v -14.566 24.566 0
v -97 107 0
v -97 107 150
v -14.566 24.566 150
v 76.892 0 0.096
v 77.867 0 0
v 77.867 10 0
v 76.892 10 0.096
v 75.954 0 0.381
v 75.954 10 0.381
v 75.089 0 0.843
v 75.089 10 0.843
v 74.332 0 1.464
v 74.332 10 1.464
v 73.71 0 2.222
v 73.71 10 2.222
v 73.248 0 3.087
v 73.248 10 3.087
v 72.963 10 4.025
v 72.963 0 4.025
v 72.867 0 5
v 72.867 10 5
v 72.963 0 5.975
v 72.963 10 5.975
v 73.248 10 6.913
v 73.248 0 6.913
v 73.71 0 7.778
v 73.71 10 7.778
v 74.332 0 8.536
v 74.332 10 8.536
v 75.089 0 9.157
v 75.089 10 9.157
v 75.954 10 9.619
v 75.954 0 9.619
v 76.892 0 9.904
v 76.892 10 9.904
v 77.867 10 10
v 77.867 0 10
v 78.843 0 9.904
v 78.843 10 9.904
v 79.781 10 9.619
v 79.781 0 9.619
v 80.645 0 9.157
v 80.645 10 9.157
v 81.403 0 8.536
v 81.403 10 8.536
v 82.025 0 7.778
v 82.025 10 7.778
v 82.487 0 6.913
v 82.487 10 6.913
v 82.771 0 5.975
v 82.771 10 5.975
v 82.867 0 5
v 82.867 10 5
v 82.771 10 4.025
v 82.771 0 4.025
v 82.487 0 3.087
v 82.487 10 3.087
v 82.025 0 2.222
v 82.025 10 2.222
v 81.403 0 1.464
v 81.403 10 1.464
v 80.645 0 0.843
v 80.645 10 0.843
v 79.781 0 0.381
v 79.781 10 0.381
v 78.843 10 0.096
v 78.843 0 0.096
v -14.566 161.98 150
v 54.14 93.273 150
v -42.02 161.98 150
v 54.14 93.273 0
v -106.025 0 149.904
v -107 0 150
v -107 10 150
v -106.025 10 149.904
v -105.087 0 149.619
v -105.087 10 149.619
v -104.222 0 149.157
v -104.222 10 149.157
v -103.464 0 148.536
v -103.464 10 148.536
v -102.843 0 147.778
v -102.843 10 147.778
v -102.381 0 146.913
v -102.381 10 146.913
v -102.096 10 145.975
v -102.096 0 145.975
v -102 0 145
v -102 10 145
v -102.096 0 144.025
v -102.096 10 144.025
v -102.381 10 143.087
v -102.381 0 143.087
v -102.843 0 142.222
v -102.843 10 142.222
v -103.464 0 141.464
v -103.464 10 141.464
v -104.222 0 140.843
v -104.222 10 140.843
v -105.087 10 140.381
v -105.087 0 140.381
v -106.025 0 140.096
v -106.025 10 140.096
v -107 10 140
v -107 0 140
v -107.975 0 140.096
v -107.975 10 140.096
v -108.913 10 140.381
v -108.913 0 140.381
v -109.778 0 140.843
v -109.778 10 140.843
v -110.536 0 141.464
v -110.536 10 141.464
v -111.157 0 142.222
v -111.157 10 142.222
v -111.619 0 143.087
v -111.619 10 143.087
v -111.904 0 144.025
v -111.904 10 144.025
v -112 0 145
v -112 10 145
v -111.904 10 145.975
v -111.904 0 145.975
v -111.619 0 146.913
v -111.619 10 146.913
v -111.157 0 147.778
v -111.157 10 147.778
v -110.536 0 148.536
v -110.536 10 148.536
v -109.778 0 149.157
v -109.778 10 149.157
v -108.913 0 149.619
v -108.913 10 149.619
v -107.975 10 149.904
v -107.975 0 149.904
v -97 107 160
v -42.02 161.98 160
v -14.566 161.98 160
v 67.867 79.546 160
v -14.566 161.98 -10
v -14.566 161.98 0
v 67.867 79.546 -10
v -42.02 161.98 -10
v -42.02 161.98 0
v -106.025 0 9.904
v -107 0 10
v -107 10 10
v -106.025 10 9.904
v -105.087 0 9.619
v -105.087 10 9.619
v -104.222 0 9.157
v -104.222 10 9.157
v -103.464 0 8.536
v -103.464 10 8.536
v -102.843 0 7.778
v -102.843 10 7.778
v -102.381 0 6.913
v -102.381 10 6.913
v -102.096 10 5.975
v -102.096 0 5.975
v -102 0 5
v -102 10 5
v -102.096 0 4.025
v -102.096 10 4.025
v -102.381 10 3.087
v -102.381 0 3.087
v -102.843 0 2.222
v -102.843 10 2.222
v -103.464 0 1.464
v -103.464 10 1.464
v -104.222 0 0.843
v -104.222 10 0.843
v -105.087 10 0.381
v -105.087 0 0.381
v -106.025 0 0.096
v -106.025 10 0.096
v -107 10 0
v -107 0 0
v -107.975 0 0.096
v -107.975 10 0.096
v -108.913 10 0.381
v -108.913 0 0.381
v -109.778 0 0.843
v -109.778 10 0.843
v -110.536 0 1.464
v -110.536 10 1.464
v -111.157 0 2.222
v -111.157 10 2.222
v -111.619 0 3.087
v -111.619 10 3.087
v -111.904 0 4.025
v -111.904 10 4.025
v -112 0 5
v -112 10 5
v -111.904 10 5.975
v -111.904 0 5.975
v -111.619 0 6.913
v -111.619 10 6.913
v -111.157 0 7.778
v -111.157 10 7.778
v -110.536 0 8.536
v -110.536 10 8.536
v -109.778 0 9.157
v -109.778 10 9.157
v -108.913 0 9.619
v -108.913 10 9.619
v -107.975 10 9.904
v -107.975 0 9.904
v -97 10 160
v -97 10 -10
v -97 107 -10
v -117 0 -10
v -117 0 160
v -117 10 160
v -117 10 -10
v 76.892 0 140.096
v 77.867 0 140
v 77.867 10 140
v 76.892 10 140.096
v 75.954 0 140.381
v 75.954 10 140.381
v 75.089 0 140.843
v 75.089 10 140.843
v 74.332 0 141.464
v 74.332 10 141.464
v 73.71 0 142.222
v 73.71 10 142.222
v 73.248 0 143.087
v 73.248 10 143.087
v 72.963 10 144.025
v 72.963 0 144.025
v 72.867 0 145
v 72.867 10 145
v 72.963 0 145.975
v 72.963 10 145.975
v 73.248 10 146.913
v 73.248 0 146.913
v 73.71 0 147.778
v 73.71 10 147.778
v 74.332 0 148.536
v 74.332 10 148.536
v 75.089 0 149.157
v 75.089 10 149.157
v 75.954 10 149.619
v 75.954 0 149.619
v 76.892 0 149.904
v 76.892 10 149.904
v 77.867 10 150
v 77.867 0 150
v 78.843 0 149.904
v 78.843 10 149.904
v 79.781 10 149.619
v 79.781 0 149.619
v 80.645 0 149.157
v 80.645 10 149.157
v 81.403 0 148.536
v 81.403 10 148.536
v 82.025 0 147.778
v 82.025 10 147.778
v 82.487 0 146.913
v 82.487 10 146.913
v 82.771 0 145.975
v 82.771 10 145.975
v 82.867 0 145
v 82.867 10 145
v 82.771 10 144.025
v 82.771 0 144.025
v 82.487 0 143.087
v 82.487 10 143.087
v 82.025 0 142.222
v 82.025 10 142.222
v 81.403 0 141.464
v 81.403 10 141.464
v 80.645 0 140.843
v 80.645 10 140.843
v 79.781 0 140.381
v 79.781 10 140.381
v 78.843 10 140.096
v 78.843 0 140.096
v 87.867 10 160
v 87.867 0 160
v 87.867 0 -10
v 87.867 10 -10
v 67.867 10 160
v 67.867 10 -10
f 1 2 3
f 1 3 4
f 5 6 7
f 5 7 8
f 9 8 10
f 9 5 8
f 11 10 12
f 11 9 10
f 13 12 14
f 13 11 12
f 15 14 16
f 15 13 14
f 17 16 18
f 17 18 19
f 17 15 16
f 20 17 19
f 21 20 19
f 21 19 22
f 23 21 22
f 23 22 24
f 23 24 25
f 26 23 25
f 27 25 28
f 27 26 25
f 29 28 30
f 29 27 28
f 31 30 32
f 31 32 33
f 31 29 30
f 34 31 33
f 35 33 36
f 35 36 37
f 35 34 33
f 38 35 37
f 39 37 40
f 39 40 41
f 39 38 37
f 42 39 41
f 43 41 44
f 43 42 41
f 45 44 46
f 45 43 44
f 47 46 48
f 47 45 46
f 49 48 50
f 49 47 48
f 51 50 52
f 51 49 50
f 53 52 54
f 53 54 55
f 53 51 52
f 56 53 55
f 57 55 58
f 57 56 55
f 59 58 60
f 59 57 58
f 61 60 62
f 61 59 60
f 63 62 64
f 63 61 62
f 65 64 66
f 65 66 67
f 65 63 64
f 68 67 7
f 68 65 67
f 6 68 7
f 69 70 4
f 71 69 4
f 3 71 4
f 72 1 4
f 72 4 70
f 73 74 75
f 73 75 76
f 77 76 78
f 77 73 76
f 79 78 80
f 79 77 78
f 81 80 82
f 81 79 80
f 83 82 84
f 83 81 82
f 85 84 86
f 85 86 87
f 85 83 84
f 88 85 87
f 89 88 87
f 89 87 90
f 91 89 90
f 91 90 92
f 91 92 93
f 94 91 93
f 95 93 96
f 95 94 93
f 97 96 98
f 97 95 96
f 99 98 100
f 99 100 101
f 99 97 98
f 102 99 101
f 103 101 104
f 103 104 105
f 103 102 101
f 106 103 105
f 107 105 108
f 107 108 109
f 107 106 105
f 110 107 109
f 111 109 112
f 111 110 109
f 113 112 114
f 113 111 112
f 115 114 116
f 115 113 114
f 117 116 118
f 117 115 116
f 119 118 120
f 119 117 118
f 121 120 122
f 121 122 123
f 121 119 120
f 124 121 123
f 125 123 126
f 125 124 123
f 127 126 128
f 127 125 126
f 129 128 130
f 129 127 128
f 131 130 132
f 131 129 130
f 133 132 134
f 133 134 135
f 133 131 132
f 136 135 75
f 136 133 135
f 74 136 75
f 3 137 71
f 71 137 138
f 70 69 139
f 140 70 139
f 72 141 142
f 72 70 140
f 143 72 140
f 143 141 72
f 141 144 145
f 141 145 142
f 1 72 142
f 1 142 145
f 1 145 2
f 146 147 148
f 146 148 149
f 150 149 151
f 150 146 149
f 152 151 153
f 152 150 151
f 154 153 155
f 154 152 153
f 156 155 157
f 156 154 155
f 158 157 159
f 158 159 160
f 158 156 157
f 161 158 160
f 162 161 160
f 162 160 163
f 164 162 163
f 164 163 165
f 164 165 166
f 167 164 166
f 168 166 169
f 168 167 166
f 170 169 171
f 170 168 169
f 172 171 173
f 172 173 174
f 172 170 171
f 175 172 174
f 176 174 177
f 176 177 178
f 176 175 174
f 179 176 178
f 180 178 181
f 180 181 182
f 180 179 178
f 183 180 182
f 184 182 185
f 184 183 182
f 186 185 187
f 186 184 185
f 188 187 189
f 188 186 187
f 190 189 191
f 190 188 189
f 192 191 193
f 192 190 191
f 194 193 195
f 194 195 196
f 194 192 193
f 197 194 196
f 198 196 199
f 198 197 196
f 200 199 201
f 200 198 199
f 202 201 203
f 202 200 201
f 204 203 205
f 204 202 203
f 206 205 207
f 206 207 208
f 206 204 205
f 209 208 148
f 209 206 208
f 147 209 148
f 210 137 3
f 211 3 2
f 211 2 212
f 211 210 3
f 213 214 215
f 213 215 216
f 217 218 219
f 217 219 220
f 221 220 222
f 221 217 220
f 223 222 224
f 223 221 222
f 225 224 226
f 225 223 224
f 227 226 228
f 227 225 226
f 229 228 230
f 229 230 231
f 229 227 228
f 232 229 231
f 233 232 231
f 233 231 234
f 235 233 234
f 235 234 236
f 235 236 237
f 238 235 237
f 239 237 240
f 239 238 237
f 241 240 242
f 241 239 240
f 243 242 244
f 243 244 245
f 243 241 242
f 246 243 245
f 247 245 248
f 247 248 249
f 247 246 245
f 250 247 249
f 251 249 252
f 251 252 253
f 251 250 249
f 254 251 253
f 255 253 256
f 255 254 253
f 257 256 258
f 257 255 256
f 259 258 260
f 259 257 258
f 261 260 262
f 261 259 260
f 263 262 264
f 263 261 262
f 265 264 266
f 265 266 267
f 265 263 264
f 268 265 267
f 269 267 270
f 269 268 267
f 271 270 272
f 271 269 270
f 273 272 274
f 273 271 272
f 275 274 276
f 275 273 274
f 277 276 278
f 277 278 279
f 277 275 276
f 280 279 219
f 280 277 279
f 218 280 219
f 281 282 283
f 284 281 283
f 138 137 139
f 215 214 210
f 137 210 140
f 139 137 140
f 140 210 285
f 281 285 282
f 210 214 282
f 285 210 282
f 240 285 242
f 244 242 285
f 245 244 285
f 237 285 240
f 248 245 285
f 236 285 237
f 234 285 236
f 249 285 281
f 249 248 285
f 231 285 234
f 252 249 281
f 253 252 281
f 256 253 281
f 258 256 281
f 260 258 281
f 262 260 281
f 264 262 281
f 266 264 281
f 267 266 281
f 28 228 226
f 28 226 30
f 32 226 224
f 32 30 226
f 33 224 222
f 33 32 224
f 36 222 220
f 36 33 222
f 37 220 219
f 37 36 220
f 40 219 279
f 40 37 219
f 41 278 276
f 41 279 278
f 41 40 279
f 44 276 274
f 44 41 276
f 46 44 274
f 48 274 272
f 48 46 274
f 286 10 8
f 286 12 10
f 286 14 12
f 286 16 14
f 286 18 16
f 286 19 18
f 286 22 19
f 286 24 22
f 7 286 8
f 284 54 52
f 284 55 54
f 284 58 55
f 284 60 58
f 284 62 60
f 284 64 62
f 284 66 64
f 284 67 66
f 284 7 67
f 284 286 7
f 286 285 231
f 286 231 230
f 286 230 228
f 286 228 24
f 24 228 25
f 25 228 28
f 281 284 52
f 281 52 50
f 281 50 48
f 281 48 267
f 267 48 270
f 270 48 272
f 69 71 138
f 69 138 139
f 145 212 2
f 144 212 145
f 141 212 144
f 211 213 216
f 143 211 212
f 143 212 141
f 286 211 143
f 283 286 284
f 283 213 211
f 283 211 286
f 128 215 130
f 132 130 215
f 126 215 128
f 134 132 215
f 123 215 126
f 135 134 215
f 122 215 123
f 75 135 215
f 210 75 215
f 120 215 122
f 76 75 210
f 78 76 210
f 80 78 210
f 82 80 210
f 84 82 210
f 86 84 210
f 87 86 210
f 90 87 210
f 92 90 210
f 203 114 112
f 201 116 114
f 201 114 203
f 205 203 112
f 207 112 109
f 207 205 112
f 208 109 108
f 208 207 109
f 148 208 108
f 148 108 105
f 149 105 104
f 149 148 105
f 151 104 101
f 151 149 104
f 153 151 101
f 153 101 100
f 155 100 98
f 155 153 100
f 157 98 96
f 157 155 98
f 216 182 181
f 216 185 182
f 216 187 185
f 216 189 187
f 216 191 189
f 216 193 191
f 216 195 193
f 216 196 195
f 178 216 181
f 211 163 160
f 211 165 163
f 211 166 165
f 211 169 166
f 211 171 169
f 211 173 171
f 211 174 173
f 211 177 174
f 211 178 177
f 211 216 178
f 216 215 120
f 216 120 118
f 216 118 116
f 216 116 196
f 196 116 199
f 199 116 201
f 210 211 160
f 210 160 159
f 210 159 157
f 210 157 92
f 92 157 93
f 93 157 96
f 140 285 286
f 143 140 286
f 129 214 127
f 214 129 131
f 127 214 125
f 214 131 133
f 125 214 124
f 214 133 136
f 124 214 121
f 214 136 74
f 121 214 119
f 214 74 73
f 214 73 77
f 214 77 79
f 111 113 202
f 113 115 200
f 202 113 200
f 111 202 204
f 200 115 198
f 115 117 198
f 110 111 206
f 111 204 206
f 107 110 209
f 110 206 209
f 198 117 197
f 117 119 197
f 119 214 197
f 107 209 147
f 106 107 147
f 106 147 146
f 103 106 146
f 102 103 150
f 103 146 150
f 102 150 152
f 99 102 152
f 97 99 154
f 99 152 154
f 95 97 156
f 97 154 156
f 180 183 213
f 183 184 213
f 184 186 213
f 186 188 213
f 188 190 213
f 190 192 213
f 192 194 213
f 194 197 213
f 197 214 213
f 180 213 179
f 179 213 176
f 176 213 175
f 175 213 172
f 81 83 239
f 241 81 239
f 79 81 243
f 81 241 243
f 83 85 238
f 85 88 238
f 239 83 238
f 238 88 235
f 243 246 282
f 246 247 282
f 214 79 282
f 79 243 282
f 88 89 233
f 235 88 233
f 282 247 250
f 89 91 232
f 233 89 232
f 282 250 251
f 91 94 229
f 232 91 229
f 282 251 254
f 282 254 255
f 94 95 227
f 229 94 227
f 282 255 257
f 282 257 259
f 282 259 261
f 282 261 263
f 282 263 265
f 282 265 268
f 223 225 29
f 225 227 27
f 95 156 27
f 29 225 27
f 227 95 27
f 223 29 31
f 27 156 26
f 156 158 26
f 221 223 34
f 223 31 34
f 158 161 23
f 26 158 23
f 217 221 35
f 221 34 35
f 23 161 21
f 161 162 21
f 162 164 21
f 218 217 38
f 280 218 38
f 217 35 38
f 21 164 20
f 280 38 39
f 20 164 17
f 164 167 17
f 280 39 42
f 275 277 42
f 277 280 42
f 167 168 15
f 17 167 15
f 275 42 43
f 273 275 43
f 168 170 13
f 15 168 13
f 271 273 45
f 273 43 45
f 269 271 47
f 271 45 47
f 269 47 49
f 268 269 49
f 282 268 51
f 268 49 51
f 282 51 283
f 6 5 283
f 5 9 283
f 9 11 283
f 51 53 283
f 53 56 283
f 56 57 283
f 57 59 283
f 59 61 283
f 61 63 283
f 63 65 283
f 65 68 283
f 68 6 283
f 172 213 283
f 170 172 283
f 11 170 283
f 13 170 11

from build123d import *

# Parameters (mm, degrees)
BOSS_EXTRUDE1_DEPTH     = 150
BOSS_EXTRUDE2_DEPTH     = 150
SKETCH6_W               = 164.867200615
SKETCH6_H               = 10
BOSS_EXTRUDE4_DEPTH     = 107
BOSS_EXTRUDE5_DEPTH     = 10
BOSS_EXTRUDE6_DEPTH     = 10
SKETCH9_W               = 20
SKETCH9_H               = 170
SKETCH9_R               = 5
BOSS_EXTRUDE7_DEPTH     = 10
CUT_EXTRUDE2_DEPTH      = 281.132270411
CUT_EXTRUDE2_DEPTH_BACK = 281.132270411
CUT_EXTRUDE3_DEPTH      = 263.34809014
CUT_EXTRUDE3_DEPTH_BACK = 263.34809014


with BuildPart() as part:
    # Sketch2 → Boss-Extrude1 (new body)
    with BuildSketch(Plane.XY):
        Polygon((0, 0), (-97, 0), (-97, 107), (0, 10), align=None)
    extrude(amount=BOSS_EXTRUDE1_DEPTH)

    # Sketch4 → Boss-Extrude2 (add)
    with BuildSketch(Plane.XY.offset(150)):
        Polygon((-14.566399692, 24.566399692), (67.867200615, 107), (67.867200615, 0), (0, 0), (0, 10), align=None)
    extrude(amount=-BOSS_EXTRUDE2_DEPTH)

    # Sketch6 → Boss-Extrude4 (add)
    with BuildSketch(Plane(origin=(0, 0, 0), x_dir=(1, 0, 0), z_dir=(0, 1, 0))):
        with Locations((-14.566399692, -155)):
            Rectangle(SKETCH6_W, SKETCH6_H)
        with Locations((-14.566399692, 5)):
            Rectangle(SKETCH6_W, SKETCH6_H)
    extrude(amount=BOSS_EXTRUDE4_DEPTH)

    # Sketch7 → Boss-Extrude5 (add)
    with BuildSketch(Plane.XY.offset(160)):
        Polygon((-97, 107), (-14.566399692, 189.433600308), (67.867200615, 107), align=None)
    extrude(amount=-BOSS_EXTRUDE5_DEPTH)

    # Sketch8 → Boss-Extrude6 (add)
    with BuildSketch(Plane(origin=(0, 0, -10), x_dir=(-1, 0, 0), z_dir=(0, 0, -1))):
        Polygon((-67.867200615, 107), (97, 107), (14.566399692, 189.433600308), align=None)
    extrude(amount=-BOSS_EXTRUDE6_DEPTH)

    # Sketch9 → Boss-Extrude7 (add)
    # profile 1 of 2: a face of its own
    with BuildSketch(Plane(origin=(0, 0, 0), x_dir=(1, 0, 0), z_dir=(0, 1, 0))):
        with Locations((-107, -75)):
            Rectangle(SKETCH9_W, SKETCH9_H)
        with Locations(Location((-107, -145, 0), (0, 0, 270))):
            Circle(SKETCH9_R, mode=Mode.SUBTRACT)
        with Locations(Location((-107, -5, 0), (0, 0, 270))):
            Circle(SKETCH9_R, mode=Mode.SUBTRACT)
    # profile 2 of 2: a face of its own
    with BuildSketch(Plane(origin=(0, 0, 0), x_dir=(1, 0, 0), z_dir=(0, 1, 0))):
        with Locations((77.867200615, -75)):
            Rectangle(SKETCH9_W, SKETCH9_H)
        with Locations(Location((77.867200615, -145, 0), (0, 0, 90))):
            Circle(SKETCH9_R, mode=Mode.SUBTRACT)
        with Locations(Location((77.867200615, -5, 0), (0, 0, 90))):
            Circle(SKETCH9_R, mode=Mode.SUBTRACT)
    extrude(amount=BOSS_EXTRUDE7_DEPTH)

    # Sketch12 → Cut-Extrude2 (cut, two sides: drawn at the far end of the back side and taken through both)
    with BuildSketch(Plane.XY.offset(160).offset(-CUT_EXTRUDE2_DEPTH_BACK)):
        Polygon((-42.02, 161.98), (12.887200615, 161.98), (-14.566399692, 189.433600308), align=None)
    extrude(amount=CUT_EXTRUDE2_DEPTH + CUT_EXTRUDE2_DEPTH_BACK, mode=Mode.SUBTRACT)

    # Sketch14 → Cut-Extrude3 (cut, two sides: drawn at the far end of the back side and taken through both)
    with BuildSketch(Plane.XY.offset(160).offset(-CUT_EXTRUDE3_DEPTH_BACK)):
        Polygon((-14.566399692, 161.98), (67.867200615, 79.546399692), (67.867200615, 107), (12.887200615, 161.98), align=None)
    extrude(amount=CUT_EXTRUDE3_DEPTH + CUT_EXTRUDE3_DEPTH_BACK, mode=Mode.SUBTRACT)


solid = part.part
